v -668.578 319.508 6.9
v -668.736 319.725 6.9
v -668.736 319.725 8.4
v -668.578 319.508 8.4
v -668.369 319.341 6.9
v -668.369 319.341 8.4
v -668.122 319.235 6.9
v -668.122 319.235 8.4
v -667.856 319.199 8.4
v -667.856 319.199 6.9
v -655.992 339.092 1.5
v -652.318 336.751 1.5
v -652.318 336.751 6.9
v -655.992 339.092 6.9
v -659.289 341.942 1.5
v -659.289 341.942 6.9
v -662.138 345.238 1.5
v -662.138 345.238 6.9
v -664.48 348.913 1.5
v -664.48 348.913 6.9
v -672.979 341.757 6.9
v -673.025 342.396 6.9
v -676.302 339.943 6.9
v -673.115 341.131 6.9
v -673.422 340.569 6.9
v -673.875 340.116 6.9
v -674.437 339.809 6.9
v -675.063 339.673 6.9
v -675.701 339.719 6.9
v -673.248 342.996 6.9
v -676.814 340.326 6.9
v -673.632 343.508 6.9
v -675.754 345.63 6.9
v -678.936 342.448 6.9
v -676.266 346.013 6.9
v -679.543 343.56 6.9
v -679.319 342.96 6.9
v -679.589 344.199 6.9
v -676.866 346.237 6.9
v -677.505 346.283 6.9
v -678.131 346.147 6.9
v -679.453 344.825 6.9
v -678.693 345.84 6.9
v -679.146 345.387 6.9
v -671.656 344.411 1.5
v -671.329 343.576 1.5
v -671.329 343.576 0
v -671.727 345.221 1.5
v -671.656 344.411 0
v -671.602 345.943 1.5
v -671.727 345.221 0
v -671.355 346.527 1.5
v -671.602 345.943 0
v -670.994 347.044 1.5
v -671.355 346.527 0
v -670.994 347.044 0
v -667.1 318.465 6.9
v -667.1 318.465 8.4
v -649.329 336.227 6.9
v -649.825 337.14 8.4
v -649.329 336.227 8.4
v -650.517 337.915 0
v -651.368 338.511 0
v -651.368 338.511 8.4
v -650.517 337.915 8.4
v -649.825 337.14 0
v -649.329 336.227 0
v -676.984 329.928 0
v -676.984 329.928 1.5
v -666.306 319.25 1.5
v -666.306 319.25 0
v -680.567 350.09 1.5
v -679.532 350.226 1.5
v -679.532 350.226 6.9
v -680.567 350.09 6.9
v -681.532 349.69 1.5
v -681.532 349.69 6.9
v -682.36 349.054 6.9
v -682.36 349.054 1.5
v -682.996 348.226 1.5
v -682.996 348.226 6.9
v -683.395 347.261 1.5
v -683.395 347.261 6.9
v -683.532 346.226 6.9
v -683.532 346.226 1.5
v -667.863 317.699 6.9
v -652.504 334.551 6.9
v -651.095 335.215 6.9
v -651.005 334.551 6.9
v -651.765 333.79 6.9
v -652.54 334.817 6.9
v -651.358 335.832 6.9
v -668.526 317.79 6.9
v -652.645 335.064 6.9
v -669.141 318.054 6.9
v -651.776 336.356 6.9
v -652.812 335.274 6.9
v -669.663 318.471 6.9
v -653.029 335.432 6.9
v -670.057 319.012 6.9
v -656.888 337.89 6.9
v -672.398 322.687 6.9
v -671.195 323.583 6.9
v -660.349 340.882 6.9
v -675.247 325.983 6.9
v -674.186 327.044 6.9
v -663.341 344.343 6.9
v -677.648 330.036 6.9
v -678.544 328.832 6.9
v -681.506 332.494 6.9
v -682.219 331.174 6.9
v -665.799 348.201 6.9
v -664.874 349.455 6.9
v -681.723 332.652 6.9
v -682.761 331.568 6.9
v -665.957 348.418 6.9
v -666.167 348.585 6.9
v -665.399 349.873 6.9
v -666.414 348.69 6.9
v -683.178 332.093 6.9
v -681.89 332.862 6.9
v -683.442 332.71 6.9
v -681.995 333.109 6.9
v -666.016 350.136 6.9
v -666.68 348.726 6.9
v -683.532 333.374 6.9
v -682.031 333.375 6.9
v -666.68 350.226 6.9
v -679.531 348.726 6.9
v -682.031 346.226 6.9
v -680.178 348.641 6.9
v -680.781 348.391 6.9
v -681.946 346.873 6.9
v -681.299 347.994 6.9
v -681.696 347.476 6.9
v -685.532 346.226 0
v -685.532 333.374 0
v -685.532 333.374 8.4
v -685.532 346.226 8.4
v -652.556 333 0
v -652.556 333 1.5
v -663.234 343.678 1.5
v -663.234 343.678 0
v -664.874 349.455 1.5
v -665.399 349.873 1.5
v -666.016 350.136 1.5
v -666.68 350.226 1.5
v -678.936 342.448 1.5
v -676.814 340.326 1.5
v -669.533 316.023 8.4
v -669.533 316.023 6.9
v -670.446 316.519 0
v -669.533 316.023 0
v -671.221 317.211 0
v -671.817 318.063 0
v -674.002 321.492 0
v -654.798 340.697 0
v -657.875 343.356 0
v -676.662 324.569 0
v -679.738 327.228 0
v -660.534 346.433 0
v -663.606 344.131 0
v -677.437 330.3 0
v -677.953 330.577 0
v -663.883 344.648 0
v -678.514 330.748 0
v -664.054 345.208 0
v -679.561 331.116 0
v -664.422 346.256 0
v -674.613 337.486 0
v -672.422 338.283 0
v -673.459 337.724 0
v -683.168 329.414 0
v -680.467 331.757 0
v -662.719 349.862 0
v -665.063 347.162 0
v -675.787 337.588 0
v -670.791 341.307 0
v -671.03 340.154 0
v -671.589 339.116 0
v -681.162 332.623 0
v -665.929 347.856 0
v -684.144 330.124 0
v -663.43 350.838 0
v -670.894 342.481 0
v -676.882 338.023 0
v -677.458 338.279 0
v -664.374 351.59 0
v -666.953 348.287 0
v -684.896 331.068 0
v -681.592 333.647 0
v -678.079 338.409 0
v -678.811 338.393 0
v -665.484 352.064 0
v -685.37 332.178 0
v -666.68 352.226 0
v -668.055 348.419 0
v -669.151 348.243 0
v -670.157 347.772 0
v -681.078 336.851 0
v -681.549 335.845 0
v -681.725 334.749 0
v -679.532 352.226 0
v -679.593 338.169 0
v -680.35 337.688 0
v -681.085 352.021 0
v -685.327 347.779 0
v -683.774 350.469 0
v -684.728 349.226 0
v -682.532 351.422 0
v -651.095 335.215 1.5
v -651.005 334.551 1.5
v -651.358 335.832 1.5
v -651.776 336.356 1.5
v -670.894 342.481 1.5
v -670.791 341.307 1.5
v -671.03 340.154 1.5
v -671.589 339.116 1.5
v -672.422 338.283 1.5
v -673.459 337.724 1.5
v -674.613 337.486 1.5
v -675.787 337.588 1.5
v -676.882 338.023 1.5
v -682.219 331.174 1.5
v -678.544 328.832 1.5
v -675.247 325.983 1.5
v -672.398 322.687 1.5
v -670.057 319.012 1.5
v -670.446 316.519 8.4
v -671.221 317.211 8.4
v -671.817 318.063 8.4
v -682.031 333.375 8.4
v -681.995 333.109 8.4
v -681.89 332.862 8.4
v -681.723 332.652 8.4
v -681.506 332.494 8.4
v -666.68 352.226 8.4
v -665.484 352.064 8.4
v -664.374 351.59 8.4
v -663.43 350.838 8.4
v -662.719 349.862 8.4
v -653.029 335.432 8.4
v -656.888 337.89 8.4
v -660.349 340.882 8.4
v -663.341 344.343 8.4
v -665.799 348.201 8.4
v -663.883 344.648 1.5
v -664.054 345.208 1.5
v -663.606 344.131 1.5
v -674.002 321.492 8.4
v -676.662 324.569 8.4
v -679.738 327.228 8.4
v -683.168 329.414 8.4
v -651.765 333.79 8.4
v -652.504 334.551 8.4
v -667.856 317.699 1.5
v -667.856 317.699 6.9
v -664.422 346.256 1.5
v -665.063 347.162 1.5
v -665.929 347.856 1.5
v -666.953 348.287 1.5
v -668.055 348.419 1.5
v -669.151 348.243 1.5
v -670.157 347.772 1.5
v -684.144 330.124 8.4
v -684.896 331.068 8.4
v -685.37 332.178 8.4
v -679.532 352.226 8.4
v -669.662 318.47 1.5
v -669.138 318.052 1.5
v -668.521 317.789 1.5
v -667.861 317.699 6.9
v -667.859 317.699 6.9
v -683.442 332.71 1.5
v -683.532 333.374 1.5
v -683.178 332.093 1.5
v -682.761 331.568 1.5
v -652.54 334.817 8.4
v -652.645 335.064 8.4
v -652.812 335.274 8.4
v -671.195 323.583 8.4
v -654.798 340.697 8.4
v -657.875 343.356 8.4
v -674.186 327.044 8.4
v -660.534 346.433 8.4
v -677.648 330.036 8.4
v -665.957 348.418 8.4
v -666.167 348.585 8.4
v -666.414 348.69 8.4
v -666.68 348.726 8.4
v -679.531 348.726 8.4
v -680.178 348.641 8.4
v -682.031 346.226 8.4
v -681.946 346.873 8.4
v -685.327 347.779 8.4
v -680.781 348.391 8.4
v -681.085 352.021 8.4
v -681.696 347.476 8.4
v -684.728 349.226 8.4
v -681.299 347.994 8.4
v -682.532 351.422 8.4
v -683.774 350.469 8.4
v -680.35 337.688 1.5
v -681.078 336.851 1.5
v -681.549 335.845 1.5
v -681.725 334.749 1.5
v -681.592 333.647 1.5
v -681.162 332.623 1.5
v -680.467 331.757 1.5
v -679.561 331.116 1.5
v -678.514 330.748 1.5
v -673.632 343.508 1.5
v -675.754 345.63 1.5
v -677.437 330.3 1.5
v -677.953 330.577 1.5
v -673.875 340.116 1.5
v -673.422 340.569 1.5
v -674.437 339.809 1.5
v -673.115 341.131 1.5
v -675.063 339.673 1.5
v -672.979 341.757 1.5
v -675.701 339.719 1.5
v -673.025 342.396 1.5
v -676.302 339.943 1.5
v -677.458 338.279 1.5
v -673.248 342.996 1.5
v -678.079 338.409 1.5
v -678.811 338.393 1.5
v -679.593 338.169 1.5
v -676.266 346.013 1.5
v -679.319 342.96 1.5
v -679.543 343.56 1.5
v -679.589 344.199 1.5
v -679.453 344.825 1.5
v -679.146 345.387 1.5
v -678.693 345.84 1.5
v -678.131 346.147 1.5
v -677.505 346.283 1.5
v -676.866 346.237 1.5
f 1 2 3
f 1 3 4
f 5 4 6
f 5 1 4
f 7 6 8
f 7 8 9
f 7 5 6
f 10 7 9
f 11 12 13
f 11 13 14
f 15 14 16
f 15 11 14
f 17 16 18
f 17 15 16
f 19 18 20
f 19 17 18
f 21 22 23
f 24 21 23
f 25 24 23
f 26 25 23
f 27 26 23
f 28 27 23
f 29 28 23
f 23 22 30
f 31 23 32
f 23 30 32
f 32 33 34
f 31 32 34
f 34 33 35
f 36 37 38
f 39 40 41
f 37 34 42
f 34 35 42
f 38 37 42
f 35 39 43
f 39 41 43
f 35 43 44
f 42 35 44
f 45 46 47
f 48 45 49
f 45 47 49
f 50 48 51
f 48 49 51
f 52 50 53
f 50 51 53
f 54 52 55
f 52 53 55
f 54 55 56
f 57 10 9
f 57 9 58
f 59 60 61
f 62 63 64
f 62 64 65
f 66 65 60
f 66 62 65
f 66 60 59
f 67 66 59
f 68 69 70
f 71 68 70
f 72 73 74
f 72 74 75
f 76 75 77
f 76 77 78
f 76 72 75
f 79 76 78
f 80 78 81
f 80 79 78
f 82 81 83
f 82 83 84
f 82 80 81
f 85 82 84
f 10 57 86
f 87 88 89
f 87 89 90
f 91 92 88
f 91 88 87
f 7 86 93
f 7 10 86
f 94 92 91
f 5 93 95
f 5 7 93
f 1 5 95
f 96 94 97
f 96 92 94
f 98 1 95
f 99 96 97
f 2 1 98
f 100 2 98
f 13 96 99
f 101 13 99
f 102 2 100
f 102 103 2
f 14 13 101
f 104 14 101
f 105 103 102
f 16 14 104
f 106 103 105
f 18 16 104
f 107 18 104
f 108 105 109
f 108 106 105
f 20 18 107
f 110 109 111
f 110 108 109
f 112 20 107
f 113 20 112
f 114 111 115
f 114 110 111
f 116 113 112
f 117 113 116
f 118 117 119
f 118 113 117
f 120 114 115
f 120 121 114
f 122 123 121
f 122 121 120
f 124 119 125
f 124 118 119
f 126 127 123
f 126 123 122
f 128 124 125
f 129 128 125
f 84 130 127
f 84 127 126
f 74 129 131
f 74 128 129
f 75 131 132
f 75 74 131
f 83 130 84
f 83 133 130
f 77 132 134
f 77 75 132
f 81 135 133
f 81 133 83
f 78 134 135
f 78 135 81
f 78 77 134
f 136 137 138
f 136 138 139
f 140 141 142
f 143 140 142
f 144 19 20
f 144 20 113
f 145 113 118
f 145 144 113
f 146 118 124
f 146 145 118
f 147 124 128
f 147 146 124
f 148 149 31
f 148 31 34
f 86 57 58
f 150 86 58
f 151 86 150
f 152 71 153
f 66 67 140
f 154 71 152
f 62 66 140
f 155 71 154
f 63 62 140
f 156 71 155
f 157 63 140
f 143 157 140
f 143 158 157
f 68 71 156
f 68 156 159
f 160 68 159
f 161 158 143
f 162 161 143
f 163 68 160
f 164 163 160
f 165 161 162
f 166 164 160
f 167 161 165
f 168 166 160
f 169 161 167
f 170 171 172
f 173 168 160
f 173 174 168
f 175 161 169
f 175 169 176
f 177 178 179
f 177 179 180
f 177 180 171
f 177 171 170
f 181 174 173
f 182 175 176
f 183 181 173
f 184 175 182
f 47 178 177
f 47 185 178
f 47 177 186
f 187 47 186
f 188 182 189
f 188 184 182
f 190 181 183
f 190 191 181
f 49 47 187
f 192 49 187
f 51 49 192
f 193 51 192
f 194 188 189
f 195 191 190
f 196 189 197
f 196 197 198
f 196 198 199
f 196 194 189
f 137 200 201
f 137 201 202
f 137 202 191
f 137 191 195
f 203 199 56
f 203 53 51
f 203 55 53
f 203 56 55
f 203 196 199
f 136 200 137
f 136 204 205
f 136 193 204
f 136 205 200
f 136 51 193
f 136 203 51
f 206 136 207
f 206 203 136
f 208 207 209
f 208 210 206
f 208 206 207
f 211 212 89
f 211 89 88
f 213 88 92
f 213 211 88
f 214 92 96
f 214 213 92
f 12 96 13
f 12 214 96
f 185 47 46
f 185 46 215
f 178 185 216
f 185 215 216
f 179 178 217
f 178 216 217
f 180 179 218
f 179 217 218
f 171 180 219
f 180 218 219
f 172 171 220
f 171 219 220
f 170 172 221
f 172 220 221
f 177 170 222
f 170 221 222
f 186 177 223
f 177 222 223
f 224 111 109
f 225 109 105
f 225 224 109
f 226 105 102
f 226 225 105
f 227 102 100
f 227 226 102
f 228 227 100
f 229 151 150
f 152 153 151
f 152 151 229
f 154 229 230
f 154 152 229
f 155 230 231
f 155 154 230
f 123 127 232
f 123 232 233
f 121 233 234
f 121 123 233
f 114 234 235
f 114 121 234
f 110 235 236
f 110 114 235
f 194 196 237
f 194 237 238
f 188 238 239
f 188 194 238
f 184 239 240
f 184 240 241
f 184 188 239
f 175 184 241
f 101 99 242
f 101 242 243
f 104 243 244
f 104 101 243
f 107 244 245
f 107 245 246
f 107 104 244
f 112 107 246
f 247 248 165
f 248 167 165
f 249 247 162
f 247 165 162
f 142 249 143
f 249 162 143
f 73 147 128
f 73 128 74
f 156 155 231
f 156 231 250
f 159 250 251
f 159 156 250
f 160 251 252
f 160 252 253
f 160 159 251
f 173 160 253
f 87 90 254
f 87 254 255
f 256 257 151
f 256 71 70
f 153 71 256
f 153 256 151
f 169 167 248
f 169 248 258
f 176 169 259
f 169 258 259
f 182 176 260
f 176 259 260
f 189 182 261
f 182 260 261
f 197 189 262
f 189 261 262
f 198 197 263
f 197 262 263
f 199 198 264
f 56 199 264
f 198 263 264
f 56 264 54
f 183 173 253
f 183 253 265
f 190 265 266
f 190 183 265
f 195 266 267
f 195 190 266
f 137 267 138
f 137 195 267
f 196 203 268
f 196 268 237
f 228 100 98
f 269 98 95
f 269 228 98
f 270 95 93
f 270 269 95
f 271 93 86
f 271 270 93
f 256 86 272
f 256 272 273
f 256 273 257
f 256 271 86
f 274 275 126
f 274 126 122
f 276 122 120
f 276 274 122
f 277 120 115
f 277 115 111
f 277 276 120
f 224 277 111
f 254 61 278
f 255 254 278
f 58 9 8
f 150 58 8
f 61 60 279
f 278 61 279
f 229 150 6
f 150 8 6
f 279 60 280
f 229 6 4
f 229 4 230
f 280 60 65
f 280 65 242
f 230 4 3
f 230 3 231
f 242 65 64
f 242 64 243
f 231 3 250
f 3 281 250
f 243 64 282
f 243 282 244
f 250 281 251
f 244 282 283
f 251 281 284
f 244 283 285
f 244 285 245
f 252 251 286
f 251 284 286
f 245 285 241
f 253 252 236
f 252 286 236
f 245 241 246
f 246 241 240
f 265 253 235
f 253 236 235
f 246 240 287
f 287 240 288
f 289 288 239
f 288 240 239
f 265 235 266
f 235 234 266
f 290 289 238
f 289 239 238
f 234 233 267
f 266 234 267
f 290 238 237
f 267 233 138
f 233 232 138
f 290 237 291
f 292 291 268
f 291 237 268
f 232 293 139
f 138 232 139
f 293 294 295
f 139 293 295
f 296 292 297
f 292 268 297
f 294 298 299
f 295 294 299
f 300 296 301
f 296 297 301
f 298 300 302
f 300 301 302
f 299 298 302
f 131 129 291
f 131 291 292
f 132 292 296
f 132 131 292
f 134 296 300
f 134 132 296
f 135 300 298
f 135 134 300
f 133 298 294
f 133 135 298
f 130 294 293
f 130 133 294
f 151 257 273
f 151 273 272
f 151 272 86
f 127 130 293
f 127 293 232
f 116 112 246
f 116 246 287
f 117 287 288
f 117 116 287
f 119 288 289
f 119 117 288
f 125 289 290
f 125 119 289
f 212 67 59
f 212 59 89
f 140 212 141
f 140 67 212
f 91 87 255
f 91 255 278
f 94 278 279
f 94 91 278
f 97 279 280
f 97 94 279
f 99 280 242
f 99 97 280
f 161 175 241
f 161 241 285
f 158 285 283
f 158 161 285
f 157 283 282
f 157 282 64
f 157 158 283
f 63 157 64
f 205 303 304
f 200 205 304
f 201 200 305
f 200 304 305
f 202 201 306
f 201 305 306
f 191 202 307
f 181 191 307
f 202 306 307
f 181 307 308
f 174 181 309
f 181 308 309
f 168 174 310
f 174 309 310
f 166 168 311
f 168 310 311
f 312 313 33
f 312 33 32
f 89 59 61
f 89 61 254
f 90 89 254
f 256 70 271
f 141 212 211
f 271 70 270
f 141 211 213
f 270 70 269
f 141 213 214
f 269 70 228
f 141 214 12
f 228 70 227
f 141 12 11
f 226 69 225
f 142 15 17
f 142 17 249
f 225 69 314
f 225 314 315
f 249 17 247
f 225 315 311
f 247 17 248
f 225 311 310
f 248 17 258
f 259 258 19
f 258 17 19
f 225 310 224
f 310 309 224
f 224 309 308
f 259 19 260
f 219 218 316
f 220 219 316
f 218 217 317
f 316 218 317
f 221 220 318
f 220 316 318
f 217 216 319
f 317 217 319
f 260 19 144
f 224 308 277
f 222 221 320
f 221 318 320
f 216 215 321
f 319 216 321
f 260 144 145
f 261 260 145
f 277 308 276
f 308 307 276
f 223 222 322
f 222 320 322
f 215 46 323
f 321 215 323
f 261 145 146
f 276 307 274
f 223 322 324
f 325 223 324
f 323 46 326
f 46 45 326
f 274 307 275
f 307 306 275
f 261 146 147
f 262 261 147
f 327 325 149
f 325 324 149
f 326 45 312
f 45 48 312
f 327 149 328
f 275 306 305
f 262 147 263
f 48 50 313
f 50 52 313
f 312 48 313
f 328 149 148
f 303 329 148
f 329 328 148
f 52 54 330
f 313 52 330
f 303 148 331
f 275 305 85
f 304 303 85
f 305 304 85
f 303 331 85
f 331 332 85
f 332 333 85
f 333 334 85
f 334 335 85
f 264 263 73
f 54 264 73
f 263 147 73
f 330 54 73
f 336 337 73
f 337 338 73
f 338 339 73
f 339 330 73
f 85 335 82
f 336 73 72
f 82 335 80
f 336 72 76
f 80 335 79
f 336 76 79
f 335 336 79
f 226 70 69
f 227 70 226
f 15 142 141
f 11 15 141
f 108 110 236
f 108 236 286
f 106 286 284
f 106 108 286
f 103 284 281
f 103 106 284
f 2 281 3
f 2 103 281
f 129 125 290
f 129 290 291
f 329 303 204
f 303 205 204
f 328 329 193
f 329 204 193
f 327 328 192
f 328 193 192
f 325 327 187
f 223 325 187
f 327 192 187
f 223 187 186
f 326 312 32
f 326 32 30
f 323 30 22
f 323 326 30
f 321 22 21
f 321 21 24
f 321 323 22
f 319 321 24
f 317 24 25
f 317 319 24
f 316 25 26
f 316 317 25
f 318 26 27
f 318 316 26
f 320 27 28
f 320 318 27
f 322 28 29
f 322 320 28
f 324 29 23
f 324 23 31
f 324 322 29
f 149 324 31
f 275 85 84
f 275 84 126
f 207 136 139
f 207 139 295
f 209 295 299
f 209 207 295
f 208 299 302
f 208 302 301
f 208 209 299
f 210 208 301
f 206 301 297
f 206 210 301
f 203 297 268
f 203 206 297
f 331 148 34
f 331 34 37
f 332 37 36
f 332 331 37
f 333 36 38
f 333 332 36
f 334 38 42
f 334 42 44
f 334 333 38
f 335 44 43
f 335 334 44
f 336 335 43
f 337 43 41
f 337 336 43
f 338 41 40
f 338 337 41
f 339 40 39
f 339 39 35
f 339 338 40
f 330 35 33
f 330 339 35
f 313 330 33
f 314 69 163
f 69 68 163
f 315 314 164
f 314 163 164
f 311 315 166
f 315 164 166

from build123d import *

# Parameters (mm, degrees)
CROQUIS4_R              = 4
SALIENTE_EXTRUIR1_DEPTH = 1.5
SALIENTE_EXTRUIR2_DEPTH = 6.9
SALIENTE_EXTRUIR3_DEPTH = 1.5
CORTAR_EXTRUIR1_DEPTH   = 1.5
REDONDEO1_R             = 3


with BuildPart() as part:
    # Croquis4 → Saliente-Extruir1 (new body)
    with BuildSketch(Plane.XY):
        with BuildLine():
            Line((-683.531695239, 333.374182683), (-683.531695239, 346.225865369))
            ThreePointArc((-683.531695239, 346.225865369), (-682.360122363, 349.054292493), (-679.531695239, 350.225865369))
            Line((-679.531695239, 350.225865369), (-666.680012553, 350.225865369))
            ThreePointArc((-666.680012553, 350.225865369), (-665.398822158, 349.872619004), (-664.479692443, 348.912706306))
            ThreePointArc((-664.479692443, 348.912706306), (-659.289054552, 341.941594121), (-652.317942367, 336.75095623))
            ThreePointArc((-652.317942367, 336.75095623), (-651.358029669, 335.831826514), (-651.004783304, 334.550636119))
            Line((-651.004783304, 334.550636119), (-667.856465989, 317.698953434))
            ThreePointArc((-667.856465989, 317.698953434), (-669.137656384, 318.052199798), (-670.0567861, 319.012112496))
            ThreePointArc((-670.0567861, 319.012112496), (-675.247423991, 325.983224681), (-682.218536176, 331.173862573))
            ThreePointArc((-682.218536176, 331.173862573), (-683.178448874, 332.092992288), (-683.531695239, 333.374182683))
        make_face()
        with Locations((-667.975346053, 334.669516182)):
            Circle(CROQUIS4_R, mode=Mode.SUBTRACT)
        with BuildLine():
            Line((-675.753520646, 345.629671291), (-673.632200302, 343.508350947))
            ThreePointArc((-673.632200302, 343.508350947), (-673.632200302, 340.326370432), (-676.814180817, 340.326370432))
            Line((-676.814180817, 340.326370432), (-678.935501161, 342.447690776))
            ThreePointArc((-678.935501161, 342.447690776), (-678.935501161, 345.629671291), (-675.753520646, 345.629671291))
        make_face(mode=Mode.SUBTRACT)
        with BuildLine():
            Line((-669.475346053, 344.419516182), (-669.475346053, 342.419516182))
            ThreePointArc((-669.475346053, 342.419516182), (-667.975346053, 340.919516182), (-666.475346053, 342.419516182))
            Line((-666.475346053, 342.419516182), (-666.475346053, 344.419516182))
            ThreePointArc((-666.475346053, 344.419516182), (-667.975346053, 345.919516182), (-669.475346053, 344.419516182))
        make_face(mode=Mode.SUBTRACT)
        with BuildLine():
            Line((-658.225346053, 336.169516182), (-660.225346053, 336.169516182))
            ThreePointArc((-660.225346053, 336.169516182), (-661.725346053, 334.669516182), (-660.225346053, 333.169516182))
            Line((-660.225346053, 333.169516182), (-658.225346053, 333.169516182))
            ThreePointArc((-658.225346053, 333.169516182), (-656.725346053, 334.669516182), (-658.225346053, 336.169516182))
        make_face(mode=Mode.SUBTRACT)
        with BuildLine():
            Line((-666.475346053, 324.919516182), (-666.475346053, 326.919516182))
            ThreePointArc((-666.475346053, 326.919516182), (-667.975346053, 328.419516182), (-669.475346053, 326.919516182))
            Line((-669.475346053, 326.919516182), (-669.475346053, 324.919516182))
            ThreePointArc((-669.475346053, 324.919516182), (-667.975346053, 323.419516182), (-666.475346053, 324.919516182))
        make_face(mode=Mode.SUBTRACT)
        with BuildLine():
            Line((-677.725346053, 333.169516182), (-675.725346053, 333.169516182))
            ThreePointArc((-675.725346053, 333.169516182), (-674.225346053, 334.669516182), (-675.725346053, 336.169516182))
            Line((-675.725346053, 336.169516182), (-677.725346053, 336.169516182))
            ThreePointArc((-677.725346053, 336.169516182), (-679.225346053, 334.669516182), (-677.725346053, 333.169516182))
        make_face(mode=Mode.SUBTRACT)
    extrude(amount=SALIENTE_EXTRUIR1_DEPTH)

    # Croquis5 → Saliente-Extruir2 (add)
    with BuildSketch(Plane(origin=(0, 0, 0), x_dir=(-1, 0, 0), z_dir=(0, 0, -1))):
        with BuildLine():
            ThreePointArc((670.0567861, 319.012112496), (669.137656384, 318.052199798), (667.856465989, 317.698953434))
            Line((667.856465989, 317.698953434), (669.532640967, 316.022778456))
            ThreePointArc((669.532640967, 316.022778456), (670.853714641, 316.842392616), (671.817042188, 318.062639746))
            ThreePointArc((671.817042188, 318.062639746), (676.661637554, 324.569011119), (683.168008926, 329.413606484))
            ThreePointArc((683.168008926, 329.413606484), (684.895851783, 331.068039972), (685.531695239, 333.374182683))
            Line((685.531695239, 333.374182683), (685.531695239, 346.225865369))
            ThreePointArc((685.531695239, 346.225865369), (683.774335926, 350.468506056), (679.531695239, 352.225865369))
            Line((679.531695239, 352.225865369), (666.680012553, 352.225865369))
            ThreePointArc((666.680012553, 352.225865369), (664.373869842, 351.590021913), (662.719436354, 349.862179056))
            ThreePointArc((662.719436354, 349.862179056), (657.874840989, 343.355807684), (651.368469617, 338.511212318))
            ThreePointArc((651.368469617, 338.511212318), (650.148222486, 337.547884771), (649.328608326, 336.226811097))
            Line((649.328608326, 336.226811097), (651.004783304, 334.550636119))
            ThreePointArc((651.004783304, 334.550636119), (651.358029669, 335.831826514), (652.317942367, 336.75095623))
            ThreePointArc((652.317942367, 336.75095623), (659.289054552, 341.941594121), (664.479692443, 348.912706306))
            ThreePointArc((664.479692443, 348.912706306), (665.398822158, 349.872619004), (666.680012553, 350.225865369))
            Line((666.680012553, 350.225865369), (679.531695239, 350.225865369))
            ThreePointArc((679.531695239, 350.225865369), (682.360122363, 349.054292493), (683.531695239, 346.225865369))
            Line((683.531695239, 346.225865369), (683.531695239, 333.374182683))
            ThreePointArc((683.531695239, 333.374182683), (683.178448874, 332.092992288), (682.218536176, 331.173862573))
            ThreePointArc((682.218536176, 331.173862573), (675.247423991, 325.983224681), (670.0567861, 319.012112496))
        make_face()
        with BuildLine():
            ThreePointArc((678.935501161, 342.447690776), (678.935501161, 345.629671291), (675.753520646, 345.629671291))
            Line((675.753520646, 345.629671291), (673.632200302, 343.508350947))
            ThreePointArc((673.632200302, 343.508350947), (673.632200302, 340.326370432), (676.814180817, 340.326370432))
            Line((676.814180817, 340.326370432), (678.935501161, 342.447690776))
        make_face()
    extrude(amount=-SALIENTE_EXTRUIR2_DEPTH)

    # Croquis6 → Saliente-Extruir3 (add)
    with BuildSketch(Plane.XY.offset(6.9)):
        with BuildLine():
            Line((-667.856465989, 319.198953434), (-667.100243806, 318.465261145))
            Line((-667.100243806, 318.465261145), (-669.532640967, 316.022778456))
            ThreePointArc((-669.532640967, 316.022778456), (-670.853714641, 316.842392616), (-671.817042188, 318.062639746))
            ThreePointArc((-671.817042188, 318.062639746), (-676.661637554, 324.569011119), (-683.168008926, 329.413606484))
            ThreePointArc((-683.168008926, 329.413606484), (-684.895851783, 331.068039972), (-685.531695239, 333.374182683))
            Line((-685.531695239, 333.374182683), (-685.531695239, 346.225865369))
            ThreePointArc((-685.531695239, 346.225865369), (-683.774335926, 350.468506056), (-679.531695239, 352.225865369))
            Line((-679.531695239, 352.225865369), (-666.680012553, 352.225865369))
            ThreePointArc((-666.680012553, 352.225865369), (-664.373869842, 351.590021913), (-662.719436354, 349.862179056))
            ThreePointArc((-662.719436354, 349.862179056), (-657.874840989, 343.355807684), (-651.368469617, 338.511212318))
            ThreePointArc((-651.368469617, 338.511212318), (-650.148222486, 337.547884771), (-649.328608326, 336.226811097))
            Line((-649.328608326, 336.226811097), (-651.765332209, 333.790087215))
            Line((-651.765332209, 333.790087215), (-652.503991007, 334.551428417))
            ThreePointArc((-652.503991007, 334.551428417), (-652.645289552, 335.063904575), (-653.029254632, 335.431556461))
            ThreePointArc((-653.029254632, 335.431556461), (-660.349095394, 340.881501273), (-665.799494351, 348.201003883))
            ThreePointArc((-665.799494351, 348.201003883), (-666.167146237, 348.584968962), (-666.679622395, 348.726267508))
            Line((-666.679622395, 348.726267508), (-679.53130508, 348.726267508))
            ThreePointArc((-679.53130508, 348.726267508), (-681.299072033, 347.994034461), (-682.03130508, 346.226267508))
            Line((-682.03130508, 346.226267508), (-682.03130508, 333.374584822))
            ThreePointArc((-682.03130508, 333.374584822), (-681.890006535, 332.862108664), (-681.506041455, 332.494456778))
            ThreePointArc((-681.506041455, 332.494456778), (-674.186373661, 327.044286992), (-668.736203875, 319.724619198))
            ThreePointArc((-668.736203875, 319.724619198), (-668.368791902, 319.340524583), (-667.856465989, 319.198953434))
        make_face()
    extrude(amount=SALIENTE_EXTRUIR3_DEPTH)

    # Croquis7 → Cortar-Extruir1 (cut)
    with BuildSketch(Plane.XY.offset(1.5)):
        with BuildLine():
            Line((-677.725346053, 330.669516182), (-666.305624647, 319.249794777))
            Line((-666.305624647, 319.249794777), (-652.555624647, 332.999794777))
            Line((-652.555624647, 332.999794777), (-663.975346053, 344.419516182))
            ThreePointArc((-663.975346053, 344.419516182), (-667.975346053, 348.419516182), (-671.975346053, 344.419516182))
            ThreePointArc((-671.975346053, 344.419516182), (-671.975346053, 338.669516182), (-677.725346053, 338.669516182))
            ThreePointArc((-677.725346053, 338.669516182), (-681.725346053, 334.669516182), (-677.725346053, 330.669516182))
        make_face()
    extrude(amount=-CORTAR_EXTRUIR1_DEPTH, mode=Mode.SUBTRACT)

    # Redondeo1
    redondeo1_edges = [part.edges().sort_by_distance(p)[0] for p in [
        (-677.725346053, 330.669516182, 0.75),
        (-677.725346053, 338.669516182, 0.75),
        (-671.975346053, 344.419516182, 0.75),
        (-663.975346053, 344.419516182, 0.75),
    ]]
    fillet(redondeo1_edges, radius=REDONDEO1_R)


solid = part.part
